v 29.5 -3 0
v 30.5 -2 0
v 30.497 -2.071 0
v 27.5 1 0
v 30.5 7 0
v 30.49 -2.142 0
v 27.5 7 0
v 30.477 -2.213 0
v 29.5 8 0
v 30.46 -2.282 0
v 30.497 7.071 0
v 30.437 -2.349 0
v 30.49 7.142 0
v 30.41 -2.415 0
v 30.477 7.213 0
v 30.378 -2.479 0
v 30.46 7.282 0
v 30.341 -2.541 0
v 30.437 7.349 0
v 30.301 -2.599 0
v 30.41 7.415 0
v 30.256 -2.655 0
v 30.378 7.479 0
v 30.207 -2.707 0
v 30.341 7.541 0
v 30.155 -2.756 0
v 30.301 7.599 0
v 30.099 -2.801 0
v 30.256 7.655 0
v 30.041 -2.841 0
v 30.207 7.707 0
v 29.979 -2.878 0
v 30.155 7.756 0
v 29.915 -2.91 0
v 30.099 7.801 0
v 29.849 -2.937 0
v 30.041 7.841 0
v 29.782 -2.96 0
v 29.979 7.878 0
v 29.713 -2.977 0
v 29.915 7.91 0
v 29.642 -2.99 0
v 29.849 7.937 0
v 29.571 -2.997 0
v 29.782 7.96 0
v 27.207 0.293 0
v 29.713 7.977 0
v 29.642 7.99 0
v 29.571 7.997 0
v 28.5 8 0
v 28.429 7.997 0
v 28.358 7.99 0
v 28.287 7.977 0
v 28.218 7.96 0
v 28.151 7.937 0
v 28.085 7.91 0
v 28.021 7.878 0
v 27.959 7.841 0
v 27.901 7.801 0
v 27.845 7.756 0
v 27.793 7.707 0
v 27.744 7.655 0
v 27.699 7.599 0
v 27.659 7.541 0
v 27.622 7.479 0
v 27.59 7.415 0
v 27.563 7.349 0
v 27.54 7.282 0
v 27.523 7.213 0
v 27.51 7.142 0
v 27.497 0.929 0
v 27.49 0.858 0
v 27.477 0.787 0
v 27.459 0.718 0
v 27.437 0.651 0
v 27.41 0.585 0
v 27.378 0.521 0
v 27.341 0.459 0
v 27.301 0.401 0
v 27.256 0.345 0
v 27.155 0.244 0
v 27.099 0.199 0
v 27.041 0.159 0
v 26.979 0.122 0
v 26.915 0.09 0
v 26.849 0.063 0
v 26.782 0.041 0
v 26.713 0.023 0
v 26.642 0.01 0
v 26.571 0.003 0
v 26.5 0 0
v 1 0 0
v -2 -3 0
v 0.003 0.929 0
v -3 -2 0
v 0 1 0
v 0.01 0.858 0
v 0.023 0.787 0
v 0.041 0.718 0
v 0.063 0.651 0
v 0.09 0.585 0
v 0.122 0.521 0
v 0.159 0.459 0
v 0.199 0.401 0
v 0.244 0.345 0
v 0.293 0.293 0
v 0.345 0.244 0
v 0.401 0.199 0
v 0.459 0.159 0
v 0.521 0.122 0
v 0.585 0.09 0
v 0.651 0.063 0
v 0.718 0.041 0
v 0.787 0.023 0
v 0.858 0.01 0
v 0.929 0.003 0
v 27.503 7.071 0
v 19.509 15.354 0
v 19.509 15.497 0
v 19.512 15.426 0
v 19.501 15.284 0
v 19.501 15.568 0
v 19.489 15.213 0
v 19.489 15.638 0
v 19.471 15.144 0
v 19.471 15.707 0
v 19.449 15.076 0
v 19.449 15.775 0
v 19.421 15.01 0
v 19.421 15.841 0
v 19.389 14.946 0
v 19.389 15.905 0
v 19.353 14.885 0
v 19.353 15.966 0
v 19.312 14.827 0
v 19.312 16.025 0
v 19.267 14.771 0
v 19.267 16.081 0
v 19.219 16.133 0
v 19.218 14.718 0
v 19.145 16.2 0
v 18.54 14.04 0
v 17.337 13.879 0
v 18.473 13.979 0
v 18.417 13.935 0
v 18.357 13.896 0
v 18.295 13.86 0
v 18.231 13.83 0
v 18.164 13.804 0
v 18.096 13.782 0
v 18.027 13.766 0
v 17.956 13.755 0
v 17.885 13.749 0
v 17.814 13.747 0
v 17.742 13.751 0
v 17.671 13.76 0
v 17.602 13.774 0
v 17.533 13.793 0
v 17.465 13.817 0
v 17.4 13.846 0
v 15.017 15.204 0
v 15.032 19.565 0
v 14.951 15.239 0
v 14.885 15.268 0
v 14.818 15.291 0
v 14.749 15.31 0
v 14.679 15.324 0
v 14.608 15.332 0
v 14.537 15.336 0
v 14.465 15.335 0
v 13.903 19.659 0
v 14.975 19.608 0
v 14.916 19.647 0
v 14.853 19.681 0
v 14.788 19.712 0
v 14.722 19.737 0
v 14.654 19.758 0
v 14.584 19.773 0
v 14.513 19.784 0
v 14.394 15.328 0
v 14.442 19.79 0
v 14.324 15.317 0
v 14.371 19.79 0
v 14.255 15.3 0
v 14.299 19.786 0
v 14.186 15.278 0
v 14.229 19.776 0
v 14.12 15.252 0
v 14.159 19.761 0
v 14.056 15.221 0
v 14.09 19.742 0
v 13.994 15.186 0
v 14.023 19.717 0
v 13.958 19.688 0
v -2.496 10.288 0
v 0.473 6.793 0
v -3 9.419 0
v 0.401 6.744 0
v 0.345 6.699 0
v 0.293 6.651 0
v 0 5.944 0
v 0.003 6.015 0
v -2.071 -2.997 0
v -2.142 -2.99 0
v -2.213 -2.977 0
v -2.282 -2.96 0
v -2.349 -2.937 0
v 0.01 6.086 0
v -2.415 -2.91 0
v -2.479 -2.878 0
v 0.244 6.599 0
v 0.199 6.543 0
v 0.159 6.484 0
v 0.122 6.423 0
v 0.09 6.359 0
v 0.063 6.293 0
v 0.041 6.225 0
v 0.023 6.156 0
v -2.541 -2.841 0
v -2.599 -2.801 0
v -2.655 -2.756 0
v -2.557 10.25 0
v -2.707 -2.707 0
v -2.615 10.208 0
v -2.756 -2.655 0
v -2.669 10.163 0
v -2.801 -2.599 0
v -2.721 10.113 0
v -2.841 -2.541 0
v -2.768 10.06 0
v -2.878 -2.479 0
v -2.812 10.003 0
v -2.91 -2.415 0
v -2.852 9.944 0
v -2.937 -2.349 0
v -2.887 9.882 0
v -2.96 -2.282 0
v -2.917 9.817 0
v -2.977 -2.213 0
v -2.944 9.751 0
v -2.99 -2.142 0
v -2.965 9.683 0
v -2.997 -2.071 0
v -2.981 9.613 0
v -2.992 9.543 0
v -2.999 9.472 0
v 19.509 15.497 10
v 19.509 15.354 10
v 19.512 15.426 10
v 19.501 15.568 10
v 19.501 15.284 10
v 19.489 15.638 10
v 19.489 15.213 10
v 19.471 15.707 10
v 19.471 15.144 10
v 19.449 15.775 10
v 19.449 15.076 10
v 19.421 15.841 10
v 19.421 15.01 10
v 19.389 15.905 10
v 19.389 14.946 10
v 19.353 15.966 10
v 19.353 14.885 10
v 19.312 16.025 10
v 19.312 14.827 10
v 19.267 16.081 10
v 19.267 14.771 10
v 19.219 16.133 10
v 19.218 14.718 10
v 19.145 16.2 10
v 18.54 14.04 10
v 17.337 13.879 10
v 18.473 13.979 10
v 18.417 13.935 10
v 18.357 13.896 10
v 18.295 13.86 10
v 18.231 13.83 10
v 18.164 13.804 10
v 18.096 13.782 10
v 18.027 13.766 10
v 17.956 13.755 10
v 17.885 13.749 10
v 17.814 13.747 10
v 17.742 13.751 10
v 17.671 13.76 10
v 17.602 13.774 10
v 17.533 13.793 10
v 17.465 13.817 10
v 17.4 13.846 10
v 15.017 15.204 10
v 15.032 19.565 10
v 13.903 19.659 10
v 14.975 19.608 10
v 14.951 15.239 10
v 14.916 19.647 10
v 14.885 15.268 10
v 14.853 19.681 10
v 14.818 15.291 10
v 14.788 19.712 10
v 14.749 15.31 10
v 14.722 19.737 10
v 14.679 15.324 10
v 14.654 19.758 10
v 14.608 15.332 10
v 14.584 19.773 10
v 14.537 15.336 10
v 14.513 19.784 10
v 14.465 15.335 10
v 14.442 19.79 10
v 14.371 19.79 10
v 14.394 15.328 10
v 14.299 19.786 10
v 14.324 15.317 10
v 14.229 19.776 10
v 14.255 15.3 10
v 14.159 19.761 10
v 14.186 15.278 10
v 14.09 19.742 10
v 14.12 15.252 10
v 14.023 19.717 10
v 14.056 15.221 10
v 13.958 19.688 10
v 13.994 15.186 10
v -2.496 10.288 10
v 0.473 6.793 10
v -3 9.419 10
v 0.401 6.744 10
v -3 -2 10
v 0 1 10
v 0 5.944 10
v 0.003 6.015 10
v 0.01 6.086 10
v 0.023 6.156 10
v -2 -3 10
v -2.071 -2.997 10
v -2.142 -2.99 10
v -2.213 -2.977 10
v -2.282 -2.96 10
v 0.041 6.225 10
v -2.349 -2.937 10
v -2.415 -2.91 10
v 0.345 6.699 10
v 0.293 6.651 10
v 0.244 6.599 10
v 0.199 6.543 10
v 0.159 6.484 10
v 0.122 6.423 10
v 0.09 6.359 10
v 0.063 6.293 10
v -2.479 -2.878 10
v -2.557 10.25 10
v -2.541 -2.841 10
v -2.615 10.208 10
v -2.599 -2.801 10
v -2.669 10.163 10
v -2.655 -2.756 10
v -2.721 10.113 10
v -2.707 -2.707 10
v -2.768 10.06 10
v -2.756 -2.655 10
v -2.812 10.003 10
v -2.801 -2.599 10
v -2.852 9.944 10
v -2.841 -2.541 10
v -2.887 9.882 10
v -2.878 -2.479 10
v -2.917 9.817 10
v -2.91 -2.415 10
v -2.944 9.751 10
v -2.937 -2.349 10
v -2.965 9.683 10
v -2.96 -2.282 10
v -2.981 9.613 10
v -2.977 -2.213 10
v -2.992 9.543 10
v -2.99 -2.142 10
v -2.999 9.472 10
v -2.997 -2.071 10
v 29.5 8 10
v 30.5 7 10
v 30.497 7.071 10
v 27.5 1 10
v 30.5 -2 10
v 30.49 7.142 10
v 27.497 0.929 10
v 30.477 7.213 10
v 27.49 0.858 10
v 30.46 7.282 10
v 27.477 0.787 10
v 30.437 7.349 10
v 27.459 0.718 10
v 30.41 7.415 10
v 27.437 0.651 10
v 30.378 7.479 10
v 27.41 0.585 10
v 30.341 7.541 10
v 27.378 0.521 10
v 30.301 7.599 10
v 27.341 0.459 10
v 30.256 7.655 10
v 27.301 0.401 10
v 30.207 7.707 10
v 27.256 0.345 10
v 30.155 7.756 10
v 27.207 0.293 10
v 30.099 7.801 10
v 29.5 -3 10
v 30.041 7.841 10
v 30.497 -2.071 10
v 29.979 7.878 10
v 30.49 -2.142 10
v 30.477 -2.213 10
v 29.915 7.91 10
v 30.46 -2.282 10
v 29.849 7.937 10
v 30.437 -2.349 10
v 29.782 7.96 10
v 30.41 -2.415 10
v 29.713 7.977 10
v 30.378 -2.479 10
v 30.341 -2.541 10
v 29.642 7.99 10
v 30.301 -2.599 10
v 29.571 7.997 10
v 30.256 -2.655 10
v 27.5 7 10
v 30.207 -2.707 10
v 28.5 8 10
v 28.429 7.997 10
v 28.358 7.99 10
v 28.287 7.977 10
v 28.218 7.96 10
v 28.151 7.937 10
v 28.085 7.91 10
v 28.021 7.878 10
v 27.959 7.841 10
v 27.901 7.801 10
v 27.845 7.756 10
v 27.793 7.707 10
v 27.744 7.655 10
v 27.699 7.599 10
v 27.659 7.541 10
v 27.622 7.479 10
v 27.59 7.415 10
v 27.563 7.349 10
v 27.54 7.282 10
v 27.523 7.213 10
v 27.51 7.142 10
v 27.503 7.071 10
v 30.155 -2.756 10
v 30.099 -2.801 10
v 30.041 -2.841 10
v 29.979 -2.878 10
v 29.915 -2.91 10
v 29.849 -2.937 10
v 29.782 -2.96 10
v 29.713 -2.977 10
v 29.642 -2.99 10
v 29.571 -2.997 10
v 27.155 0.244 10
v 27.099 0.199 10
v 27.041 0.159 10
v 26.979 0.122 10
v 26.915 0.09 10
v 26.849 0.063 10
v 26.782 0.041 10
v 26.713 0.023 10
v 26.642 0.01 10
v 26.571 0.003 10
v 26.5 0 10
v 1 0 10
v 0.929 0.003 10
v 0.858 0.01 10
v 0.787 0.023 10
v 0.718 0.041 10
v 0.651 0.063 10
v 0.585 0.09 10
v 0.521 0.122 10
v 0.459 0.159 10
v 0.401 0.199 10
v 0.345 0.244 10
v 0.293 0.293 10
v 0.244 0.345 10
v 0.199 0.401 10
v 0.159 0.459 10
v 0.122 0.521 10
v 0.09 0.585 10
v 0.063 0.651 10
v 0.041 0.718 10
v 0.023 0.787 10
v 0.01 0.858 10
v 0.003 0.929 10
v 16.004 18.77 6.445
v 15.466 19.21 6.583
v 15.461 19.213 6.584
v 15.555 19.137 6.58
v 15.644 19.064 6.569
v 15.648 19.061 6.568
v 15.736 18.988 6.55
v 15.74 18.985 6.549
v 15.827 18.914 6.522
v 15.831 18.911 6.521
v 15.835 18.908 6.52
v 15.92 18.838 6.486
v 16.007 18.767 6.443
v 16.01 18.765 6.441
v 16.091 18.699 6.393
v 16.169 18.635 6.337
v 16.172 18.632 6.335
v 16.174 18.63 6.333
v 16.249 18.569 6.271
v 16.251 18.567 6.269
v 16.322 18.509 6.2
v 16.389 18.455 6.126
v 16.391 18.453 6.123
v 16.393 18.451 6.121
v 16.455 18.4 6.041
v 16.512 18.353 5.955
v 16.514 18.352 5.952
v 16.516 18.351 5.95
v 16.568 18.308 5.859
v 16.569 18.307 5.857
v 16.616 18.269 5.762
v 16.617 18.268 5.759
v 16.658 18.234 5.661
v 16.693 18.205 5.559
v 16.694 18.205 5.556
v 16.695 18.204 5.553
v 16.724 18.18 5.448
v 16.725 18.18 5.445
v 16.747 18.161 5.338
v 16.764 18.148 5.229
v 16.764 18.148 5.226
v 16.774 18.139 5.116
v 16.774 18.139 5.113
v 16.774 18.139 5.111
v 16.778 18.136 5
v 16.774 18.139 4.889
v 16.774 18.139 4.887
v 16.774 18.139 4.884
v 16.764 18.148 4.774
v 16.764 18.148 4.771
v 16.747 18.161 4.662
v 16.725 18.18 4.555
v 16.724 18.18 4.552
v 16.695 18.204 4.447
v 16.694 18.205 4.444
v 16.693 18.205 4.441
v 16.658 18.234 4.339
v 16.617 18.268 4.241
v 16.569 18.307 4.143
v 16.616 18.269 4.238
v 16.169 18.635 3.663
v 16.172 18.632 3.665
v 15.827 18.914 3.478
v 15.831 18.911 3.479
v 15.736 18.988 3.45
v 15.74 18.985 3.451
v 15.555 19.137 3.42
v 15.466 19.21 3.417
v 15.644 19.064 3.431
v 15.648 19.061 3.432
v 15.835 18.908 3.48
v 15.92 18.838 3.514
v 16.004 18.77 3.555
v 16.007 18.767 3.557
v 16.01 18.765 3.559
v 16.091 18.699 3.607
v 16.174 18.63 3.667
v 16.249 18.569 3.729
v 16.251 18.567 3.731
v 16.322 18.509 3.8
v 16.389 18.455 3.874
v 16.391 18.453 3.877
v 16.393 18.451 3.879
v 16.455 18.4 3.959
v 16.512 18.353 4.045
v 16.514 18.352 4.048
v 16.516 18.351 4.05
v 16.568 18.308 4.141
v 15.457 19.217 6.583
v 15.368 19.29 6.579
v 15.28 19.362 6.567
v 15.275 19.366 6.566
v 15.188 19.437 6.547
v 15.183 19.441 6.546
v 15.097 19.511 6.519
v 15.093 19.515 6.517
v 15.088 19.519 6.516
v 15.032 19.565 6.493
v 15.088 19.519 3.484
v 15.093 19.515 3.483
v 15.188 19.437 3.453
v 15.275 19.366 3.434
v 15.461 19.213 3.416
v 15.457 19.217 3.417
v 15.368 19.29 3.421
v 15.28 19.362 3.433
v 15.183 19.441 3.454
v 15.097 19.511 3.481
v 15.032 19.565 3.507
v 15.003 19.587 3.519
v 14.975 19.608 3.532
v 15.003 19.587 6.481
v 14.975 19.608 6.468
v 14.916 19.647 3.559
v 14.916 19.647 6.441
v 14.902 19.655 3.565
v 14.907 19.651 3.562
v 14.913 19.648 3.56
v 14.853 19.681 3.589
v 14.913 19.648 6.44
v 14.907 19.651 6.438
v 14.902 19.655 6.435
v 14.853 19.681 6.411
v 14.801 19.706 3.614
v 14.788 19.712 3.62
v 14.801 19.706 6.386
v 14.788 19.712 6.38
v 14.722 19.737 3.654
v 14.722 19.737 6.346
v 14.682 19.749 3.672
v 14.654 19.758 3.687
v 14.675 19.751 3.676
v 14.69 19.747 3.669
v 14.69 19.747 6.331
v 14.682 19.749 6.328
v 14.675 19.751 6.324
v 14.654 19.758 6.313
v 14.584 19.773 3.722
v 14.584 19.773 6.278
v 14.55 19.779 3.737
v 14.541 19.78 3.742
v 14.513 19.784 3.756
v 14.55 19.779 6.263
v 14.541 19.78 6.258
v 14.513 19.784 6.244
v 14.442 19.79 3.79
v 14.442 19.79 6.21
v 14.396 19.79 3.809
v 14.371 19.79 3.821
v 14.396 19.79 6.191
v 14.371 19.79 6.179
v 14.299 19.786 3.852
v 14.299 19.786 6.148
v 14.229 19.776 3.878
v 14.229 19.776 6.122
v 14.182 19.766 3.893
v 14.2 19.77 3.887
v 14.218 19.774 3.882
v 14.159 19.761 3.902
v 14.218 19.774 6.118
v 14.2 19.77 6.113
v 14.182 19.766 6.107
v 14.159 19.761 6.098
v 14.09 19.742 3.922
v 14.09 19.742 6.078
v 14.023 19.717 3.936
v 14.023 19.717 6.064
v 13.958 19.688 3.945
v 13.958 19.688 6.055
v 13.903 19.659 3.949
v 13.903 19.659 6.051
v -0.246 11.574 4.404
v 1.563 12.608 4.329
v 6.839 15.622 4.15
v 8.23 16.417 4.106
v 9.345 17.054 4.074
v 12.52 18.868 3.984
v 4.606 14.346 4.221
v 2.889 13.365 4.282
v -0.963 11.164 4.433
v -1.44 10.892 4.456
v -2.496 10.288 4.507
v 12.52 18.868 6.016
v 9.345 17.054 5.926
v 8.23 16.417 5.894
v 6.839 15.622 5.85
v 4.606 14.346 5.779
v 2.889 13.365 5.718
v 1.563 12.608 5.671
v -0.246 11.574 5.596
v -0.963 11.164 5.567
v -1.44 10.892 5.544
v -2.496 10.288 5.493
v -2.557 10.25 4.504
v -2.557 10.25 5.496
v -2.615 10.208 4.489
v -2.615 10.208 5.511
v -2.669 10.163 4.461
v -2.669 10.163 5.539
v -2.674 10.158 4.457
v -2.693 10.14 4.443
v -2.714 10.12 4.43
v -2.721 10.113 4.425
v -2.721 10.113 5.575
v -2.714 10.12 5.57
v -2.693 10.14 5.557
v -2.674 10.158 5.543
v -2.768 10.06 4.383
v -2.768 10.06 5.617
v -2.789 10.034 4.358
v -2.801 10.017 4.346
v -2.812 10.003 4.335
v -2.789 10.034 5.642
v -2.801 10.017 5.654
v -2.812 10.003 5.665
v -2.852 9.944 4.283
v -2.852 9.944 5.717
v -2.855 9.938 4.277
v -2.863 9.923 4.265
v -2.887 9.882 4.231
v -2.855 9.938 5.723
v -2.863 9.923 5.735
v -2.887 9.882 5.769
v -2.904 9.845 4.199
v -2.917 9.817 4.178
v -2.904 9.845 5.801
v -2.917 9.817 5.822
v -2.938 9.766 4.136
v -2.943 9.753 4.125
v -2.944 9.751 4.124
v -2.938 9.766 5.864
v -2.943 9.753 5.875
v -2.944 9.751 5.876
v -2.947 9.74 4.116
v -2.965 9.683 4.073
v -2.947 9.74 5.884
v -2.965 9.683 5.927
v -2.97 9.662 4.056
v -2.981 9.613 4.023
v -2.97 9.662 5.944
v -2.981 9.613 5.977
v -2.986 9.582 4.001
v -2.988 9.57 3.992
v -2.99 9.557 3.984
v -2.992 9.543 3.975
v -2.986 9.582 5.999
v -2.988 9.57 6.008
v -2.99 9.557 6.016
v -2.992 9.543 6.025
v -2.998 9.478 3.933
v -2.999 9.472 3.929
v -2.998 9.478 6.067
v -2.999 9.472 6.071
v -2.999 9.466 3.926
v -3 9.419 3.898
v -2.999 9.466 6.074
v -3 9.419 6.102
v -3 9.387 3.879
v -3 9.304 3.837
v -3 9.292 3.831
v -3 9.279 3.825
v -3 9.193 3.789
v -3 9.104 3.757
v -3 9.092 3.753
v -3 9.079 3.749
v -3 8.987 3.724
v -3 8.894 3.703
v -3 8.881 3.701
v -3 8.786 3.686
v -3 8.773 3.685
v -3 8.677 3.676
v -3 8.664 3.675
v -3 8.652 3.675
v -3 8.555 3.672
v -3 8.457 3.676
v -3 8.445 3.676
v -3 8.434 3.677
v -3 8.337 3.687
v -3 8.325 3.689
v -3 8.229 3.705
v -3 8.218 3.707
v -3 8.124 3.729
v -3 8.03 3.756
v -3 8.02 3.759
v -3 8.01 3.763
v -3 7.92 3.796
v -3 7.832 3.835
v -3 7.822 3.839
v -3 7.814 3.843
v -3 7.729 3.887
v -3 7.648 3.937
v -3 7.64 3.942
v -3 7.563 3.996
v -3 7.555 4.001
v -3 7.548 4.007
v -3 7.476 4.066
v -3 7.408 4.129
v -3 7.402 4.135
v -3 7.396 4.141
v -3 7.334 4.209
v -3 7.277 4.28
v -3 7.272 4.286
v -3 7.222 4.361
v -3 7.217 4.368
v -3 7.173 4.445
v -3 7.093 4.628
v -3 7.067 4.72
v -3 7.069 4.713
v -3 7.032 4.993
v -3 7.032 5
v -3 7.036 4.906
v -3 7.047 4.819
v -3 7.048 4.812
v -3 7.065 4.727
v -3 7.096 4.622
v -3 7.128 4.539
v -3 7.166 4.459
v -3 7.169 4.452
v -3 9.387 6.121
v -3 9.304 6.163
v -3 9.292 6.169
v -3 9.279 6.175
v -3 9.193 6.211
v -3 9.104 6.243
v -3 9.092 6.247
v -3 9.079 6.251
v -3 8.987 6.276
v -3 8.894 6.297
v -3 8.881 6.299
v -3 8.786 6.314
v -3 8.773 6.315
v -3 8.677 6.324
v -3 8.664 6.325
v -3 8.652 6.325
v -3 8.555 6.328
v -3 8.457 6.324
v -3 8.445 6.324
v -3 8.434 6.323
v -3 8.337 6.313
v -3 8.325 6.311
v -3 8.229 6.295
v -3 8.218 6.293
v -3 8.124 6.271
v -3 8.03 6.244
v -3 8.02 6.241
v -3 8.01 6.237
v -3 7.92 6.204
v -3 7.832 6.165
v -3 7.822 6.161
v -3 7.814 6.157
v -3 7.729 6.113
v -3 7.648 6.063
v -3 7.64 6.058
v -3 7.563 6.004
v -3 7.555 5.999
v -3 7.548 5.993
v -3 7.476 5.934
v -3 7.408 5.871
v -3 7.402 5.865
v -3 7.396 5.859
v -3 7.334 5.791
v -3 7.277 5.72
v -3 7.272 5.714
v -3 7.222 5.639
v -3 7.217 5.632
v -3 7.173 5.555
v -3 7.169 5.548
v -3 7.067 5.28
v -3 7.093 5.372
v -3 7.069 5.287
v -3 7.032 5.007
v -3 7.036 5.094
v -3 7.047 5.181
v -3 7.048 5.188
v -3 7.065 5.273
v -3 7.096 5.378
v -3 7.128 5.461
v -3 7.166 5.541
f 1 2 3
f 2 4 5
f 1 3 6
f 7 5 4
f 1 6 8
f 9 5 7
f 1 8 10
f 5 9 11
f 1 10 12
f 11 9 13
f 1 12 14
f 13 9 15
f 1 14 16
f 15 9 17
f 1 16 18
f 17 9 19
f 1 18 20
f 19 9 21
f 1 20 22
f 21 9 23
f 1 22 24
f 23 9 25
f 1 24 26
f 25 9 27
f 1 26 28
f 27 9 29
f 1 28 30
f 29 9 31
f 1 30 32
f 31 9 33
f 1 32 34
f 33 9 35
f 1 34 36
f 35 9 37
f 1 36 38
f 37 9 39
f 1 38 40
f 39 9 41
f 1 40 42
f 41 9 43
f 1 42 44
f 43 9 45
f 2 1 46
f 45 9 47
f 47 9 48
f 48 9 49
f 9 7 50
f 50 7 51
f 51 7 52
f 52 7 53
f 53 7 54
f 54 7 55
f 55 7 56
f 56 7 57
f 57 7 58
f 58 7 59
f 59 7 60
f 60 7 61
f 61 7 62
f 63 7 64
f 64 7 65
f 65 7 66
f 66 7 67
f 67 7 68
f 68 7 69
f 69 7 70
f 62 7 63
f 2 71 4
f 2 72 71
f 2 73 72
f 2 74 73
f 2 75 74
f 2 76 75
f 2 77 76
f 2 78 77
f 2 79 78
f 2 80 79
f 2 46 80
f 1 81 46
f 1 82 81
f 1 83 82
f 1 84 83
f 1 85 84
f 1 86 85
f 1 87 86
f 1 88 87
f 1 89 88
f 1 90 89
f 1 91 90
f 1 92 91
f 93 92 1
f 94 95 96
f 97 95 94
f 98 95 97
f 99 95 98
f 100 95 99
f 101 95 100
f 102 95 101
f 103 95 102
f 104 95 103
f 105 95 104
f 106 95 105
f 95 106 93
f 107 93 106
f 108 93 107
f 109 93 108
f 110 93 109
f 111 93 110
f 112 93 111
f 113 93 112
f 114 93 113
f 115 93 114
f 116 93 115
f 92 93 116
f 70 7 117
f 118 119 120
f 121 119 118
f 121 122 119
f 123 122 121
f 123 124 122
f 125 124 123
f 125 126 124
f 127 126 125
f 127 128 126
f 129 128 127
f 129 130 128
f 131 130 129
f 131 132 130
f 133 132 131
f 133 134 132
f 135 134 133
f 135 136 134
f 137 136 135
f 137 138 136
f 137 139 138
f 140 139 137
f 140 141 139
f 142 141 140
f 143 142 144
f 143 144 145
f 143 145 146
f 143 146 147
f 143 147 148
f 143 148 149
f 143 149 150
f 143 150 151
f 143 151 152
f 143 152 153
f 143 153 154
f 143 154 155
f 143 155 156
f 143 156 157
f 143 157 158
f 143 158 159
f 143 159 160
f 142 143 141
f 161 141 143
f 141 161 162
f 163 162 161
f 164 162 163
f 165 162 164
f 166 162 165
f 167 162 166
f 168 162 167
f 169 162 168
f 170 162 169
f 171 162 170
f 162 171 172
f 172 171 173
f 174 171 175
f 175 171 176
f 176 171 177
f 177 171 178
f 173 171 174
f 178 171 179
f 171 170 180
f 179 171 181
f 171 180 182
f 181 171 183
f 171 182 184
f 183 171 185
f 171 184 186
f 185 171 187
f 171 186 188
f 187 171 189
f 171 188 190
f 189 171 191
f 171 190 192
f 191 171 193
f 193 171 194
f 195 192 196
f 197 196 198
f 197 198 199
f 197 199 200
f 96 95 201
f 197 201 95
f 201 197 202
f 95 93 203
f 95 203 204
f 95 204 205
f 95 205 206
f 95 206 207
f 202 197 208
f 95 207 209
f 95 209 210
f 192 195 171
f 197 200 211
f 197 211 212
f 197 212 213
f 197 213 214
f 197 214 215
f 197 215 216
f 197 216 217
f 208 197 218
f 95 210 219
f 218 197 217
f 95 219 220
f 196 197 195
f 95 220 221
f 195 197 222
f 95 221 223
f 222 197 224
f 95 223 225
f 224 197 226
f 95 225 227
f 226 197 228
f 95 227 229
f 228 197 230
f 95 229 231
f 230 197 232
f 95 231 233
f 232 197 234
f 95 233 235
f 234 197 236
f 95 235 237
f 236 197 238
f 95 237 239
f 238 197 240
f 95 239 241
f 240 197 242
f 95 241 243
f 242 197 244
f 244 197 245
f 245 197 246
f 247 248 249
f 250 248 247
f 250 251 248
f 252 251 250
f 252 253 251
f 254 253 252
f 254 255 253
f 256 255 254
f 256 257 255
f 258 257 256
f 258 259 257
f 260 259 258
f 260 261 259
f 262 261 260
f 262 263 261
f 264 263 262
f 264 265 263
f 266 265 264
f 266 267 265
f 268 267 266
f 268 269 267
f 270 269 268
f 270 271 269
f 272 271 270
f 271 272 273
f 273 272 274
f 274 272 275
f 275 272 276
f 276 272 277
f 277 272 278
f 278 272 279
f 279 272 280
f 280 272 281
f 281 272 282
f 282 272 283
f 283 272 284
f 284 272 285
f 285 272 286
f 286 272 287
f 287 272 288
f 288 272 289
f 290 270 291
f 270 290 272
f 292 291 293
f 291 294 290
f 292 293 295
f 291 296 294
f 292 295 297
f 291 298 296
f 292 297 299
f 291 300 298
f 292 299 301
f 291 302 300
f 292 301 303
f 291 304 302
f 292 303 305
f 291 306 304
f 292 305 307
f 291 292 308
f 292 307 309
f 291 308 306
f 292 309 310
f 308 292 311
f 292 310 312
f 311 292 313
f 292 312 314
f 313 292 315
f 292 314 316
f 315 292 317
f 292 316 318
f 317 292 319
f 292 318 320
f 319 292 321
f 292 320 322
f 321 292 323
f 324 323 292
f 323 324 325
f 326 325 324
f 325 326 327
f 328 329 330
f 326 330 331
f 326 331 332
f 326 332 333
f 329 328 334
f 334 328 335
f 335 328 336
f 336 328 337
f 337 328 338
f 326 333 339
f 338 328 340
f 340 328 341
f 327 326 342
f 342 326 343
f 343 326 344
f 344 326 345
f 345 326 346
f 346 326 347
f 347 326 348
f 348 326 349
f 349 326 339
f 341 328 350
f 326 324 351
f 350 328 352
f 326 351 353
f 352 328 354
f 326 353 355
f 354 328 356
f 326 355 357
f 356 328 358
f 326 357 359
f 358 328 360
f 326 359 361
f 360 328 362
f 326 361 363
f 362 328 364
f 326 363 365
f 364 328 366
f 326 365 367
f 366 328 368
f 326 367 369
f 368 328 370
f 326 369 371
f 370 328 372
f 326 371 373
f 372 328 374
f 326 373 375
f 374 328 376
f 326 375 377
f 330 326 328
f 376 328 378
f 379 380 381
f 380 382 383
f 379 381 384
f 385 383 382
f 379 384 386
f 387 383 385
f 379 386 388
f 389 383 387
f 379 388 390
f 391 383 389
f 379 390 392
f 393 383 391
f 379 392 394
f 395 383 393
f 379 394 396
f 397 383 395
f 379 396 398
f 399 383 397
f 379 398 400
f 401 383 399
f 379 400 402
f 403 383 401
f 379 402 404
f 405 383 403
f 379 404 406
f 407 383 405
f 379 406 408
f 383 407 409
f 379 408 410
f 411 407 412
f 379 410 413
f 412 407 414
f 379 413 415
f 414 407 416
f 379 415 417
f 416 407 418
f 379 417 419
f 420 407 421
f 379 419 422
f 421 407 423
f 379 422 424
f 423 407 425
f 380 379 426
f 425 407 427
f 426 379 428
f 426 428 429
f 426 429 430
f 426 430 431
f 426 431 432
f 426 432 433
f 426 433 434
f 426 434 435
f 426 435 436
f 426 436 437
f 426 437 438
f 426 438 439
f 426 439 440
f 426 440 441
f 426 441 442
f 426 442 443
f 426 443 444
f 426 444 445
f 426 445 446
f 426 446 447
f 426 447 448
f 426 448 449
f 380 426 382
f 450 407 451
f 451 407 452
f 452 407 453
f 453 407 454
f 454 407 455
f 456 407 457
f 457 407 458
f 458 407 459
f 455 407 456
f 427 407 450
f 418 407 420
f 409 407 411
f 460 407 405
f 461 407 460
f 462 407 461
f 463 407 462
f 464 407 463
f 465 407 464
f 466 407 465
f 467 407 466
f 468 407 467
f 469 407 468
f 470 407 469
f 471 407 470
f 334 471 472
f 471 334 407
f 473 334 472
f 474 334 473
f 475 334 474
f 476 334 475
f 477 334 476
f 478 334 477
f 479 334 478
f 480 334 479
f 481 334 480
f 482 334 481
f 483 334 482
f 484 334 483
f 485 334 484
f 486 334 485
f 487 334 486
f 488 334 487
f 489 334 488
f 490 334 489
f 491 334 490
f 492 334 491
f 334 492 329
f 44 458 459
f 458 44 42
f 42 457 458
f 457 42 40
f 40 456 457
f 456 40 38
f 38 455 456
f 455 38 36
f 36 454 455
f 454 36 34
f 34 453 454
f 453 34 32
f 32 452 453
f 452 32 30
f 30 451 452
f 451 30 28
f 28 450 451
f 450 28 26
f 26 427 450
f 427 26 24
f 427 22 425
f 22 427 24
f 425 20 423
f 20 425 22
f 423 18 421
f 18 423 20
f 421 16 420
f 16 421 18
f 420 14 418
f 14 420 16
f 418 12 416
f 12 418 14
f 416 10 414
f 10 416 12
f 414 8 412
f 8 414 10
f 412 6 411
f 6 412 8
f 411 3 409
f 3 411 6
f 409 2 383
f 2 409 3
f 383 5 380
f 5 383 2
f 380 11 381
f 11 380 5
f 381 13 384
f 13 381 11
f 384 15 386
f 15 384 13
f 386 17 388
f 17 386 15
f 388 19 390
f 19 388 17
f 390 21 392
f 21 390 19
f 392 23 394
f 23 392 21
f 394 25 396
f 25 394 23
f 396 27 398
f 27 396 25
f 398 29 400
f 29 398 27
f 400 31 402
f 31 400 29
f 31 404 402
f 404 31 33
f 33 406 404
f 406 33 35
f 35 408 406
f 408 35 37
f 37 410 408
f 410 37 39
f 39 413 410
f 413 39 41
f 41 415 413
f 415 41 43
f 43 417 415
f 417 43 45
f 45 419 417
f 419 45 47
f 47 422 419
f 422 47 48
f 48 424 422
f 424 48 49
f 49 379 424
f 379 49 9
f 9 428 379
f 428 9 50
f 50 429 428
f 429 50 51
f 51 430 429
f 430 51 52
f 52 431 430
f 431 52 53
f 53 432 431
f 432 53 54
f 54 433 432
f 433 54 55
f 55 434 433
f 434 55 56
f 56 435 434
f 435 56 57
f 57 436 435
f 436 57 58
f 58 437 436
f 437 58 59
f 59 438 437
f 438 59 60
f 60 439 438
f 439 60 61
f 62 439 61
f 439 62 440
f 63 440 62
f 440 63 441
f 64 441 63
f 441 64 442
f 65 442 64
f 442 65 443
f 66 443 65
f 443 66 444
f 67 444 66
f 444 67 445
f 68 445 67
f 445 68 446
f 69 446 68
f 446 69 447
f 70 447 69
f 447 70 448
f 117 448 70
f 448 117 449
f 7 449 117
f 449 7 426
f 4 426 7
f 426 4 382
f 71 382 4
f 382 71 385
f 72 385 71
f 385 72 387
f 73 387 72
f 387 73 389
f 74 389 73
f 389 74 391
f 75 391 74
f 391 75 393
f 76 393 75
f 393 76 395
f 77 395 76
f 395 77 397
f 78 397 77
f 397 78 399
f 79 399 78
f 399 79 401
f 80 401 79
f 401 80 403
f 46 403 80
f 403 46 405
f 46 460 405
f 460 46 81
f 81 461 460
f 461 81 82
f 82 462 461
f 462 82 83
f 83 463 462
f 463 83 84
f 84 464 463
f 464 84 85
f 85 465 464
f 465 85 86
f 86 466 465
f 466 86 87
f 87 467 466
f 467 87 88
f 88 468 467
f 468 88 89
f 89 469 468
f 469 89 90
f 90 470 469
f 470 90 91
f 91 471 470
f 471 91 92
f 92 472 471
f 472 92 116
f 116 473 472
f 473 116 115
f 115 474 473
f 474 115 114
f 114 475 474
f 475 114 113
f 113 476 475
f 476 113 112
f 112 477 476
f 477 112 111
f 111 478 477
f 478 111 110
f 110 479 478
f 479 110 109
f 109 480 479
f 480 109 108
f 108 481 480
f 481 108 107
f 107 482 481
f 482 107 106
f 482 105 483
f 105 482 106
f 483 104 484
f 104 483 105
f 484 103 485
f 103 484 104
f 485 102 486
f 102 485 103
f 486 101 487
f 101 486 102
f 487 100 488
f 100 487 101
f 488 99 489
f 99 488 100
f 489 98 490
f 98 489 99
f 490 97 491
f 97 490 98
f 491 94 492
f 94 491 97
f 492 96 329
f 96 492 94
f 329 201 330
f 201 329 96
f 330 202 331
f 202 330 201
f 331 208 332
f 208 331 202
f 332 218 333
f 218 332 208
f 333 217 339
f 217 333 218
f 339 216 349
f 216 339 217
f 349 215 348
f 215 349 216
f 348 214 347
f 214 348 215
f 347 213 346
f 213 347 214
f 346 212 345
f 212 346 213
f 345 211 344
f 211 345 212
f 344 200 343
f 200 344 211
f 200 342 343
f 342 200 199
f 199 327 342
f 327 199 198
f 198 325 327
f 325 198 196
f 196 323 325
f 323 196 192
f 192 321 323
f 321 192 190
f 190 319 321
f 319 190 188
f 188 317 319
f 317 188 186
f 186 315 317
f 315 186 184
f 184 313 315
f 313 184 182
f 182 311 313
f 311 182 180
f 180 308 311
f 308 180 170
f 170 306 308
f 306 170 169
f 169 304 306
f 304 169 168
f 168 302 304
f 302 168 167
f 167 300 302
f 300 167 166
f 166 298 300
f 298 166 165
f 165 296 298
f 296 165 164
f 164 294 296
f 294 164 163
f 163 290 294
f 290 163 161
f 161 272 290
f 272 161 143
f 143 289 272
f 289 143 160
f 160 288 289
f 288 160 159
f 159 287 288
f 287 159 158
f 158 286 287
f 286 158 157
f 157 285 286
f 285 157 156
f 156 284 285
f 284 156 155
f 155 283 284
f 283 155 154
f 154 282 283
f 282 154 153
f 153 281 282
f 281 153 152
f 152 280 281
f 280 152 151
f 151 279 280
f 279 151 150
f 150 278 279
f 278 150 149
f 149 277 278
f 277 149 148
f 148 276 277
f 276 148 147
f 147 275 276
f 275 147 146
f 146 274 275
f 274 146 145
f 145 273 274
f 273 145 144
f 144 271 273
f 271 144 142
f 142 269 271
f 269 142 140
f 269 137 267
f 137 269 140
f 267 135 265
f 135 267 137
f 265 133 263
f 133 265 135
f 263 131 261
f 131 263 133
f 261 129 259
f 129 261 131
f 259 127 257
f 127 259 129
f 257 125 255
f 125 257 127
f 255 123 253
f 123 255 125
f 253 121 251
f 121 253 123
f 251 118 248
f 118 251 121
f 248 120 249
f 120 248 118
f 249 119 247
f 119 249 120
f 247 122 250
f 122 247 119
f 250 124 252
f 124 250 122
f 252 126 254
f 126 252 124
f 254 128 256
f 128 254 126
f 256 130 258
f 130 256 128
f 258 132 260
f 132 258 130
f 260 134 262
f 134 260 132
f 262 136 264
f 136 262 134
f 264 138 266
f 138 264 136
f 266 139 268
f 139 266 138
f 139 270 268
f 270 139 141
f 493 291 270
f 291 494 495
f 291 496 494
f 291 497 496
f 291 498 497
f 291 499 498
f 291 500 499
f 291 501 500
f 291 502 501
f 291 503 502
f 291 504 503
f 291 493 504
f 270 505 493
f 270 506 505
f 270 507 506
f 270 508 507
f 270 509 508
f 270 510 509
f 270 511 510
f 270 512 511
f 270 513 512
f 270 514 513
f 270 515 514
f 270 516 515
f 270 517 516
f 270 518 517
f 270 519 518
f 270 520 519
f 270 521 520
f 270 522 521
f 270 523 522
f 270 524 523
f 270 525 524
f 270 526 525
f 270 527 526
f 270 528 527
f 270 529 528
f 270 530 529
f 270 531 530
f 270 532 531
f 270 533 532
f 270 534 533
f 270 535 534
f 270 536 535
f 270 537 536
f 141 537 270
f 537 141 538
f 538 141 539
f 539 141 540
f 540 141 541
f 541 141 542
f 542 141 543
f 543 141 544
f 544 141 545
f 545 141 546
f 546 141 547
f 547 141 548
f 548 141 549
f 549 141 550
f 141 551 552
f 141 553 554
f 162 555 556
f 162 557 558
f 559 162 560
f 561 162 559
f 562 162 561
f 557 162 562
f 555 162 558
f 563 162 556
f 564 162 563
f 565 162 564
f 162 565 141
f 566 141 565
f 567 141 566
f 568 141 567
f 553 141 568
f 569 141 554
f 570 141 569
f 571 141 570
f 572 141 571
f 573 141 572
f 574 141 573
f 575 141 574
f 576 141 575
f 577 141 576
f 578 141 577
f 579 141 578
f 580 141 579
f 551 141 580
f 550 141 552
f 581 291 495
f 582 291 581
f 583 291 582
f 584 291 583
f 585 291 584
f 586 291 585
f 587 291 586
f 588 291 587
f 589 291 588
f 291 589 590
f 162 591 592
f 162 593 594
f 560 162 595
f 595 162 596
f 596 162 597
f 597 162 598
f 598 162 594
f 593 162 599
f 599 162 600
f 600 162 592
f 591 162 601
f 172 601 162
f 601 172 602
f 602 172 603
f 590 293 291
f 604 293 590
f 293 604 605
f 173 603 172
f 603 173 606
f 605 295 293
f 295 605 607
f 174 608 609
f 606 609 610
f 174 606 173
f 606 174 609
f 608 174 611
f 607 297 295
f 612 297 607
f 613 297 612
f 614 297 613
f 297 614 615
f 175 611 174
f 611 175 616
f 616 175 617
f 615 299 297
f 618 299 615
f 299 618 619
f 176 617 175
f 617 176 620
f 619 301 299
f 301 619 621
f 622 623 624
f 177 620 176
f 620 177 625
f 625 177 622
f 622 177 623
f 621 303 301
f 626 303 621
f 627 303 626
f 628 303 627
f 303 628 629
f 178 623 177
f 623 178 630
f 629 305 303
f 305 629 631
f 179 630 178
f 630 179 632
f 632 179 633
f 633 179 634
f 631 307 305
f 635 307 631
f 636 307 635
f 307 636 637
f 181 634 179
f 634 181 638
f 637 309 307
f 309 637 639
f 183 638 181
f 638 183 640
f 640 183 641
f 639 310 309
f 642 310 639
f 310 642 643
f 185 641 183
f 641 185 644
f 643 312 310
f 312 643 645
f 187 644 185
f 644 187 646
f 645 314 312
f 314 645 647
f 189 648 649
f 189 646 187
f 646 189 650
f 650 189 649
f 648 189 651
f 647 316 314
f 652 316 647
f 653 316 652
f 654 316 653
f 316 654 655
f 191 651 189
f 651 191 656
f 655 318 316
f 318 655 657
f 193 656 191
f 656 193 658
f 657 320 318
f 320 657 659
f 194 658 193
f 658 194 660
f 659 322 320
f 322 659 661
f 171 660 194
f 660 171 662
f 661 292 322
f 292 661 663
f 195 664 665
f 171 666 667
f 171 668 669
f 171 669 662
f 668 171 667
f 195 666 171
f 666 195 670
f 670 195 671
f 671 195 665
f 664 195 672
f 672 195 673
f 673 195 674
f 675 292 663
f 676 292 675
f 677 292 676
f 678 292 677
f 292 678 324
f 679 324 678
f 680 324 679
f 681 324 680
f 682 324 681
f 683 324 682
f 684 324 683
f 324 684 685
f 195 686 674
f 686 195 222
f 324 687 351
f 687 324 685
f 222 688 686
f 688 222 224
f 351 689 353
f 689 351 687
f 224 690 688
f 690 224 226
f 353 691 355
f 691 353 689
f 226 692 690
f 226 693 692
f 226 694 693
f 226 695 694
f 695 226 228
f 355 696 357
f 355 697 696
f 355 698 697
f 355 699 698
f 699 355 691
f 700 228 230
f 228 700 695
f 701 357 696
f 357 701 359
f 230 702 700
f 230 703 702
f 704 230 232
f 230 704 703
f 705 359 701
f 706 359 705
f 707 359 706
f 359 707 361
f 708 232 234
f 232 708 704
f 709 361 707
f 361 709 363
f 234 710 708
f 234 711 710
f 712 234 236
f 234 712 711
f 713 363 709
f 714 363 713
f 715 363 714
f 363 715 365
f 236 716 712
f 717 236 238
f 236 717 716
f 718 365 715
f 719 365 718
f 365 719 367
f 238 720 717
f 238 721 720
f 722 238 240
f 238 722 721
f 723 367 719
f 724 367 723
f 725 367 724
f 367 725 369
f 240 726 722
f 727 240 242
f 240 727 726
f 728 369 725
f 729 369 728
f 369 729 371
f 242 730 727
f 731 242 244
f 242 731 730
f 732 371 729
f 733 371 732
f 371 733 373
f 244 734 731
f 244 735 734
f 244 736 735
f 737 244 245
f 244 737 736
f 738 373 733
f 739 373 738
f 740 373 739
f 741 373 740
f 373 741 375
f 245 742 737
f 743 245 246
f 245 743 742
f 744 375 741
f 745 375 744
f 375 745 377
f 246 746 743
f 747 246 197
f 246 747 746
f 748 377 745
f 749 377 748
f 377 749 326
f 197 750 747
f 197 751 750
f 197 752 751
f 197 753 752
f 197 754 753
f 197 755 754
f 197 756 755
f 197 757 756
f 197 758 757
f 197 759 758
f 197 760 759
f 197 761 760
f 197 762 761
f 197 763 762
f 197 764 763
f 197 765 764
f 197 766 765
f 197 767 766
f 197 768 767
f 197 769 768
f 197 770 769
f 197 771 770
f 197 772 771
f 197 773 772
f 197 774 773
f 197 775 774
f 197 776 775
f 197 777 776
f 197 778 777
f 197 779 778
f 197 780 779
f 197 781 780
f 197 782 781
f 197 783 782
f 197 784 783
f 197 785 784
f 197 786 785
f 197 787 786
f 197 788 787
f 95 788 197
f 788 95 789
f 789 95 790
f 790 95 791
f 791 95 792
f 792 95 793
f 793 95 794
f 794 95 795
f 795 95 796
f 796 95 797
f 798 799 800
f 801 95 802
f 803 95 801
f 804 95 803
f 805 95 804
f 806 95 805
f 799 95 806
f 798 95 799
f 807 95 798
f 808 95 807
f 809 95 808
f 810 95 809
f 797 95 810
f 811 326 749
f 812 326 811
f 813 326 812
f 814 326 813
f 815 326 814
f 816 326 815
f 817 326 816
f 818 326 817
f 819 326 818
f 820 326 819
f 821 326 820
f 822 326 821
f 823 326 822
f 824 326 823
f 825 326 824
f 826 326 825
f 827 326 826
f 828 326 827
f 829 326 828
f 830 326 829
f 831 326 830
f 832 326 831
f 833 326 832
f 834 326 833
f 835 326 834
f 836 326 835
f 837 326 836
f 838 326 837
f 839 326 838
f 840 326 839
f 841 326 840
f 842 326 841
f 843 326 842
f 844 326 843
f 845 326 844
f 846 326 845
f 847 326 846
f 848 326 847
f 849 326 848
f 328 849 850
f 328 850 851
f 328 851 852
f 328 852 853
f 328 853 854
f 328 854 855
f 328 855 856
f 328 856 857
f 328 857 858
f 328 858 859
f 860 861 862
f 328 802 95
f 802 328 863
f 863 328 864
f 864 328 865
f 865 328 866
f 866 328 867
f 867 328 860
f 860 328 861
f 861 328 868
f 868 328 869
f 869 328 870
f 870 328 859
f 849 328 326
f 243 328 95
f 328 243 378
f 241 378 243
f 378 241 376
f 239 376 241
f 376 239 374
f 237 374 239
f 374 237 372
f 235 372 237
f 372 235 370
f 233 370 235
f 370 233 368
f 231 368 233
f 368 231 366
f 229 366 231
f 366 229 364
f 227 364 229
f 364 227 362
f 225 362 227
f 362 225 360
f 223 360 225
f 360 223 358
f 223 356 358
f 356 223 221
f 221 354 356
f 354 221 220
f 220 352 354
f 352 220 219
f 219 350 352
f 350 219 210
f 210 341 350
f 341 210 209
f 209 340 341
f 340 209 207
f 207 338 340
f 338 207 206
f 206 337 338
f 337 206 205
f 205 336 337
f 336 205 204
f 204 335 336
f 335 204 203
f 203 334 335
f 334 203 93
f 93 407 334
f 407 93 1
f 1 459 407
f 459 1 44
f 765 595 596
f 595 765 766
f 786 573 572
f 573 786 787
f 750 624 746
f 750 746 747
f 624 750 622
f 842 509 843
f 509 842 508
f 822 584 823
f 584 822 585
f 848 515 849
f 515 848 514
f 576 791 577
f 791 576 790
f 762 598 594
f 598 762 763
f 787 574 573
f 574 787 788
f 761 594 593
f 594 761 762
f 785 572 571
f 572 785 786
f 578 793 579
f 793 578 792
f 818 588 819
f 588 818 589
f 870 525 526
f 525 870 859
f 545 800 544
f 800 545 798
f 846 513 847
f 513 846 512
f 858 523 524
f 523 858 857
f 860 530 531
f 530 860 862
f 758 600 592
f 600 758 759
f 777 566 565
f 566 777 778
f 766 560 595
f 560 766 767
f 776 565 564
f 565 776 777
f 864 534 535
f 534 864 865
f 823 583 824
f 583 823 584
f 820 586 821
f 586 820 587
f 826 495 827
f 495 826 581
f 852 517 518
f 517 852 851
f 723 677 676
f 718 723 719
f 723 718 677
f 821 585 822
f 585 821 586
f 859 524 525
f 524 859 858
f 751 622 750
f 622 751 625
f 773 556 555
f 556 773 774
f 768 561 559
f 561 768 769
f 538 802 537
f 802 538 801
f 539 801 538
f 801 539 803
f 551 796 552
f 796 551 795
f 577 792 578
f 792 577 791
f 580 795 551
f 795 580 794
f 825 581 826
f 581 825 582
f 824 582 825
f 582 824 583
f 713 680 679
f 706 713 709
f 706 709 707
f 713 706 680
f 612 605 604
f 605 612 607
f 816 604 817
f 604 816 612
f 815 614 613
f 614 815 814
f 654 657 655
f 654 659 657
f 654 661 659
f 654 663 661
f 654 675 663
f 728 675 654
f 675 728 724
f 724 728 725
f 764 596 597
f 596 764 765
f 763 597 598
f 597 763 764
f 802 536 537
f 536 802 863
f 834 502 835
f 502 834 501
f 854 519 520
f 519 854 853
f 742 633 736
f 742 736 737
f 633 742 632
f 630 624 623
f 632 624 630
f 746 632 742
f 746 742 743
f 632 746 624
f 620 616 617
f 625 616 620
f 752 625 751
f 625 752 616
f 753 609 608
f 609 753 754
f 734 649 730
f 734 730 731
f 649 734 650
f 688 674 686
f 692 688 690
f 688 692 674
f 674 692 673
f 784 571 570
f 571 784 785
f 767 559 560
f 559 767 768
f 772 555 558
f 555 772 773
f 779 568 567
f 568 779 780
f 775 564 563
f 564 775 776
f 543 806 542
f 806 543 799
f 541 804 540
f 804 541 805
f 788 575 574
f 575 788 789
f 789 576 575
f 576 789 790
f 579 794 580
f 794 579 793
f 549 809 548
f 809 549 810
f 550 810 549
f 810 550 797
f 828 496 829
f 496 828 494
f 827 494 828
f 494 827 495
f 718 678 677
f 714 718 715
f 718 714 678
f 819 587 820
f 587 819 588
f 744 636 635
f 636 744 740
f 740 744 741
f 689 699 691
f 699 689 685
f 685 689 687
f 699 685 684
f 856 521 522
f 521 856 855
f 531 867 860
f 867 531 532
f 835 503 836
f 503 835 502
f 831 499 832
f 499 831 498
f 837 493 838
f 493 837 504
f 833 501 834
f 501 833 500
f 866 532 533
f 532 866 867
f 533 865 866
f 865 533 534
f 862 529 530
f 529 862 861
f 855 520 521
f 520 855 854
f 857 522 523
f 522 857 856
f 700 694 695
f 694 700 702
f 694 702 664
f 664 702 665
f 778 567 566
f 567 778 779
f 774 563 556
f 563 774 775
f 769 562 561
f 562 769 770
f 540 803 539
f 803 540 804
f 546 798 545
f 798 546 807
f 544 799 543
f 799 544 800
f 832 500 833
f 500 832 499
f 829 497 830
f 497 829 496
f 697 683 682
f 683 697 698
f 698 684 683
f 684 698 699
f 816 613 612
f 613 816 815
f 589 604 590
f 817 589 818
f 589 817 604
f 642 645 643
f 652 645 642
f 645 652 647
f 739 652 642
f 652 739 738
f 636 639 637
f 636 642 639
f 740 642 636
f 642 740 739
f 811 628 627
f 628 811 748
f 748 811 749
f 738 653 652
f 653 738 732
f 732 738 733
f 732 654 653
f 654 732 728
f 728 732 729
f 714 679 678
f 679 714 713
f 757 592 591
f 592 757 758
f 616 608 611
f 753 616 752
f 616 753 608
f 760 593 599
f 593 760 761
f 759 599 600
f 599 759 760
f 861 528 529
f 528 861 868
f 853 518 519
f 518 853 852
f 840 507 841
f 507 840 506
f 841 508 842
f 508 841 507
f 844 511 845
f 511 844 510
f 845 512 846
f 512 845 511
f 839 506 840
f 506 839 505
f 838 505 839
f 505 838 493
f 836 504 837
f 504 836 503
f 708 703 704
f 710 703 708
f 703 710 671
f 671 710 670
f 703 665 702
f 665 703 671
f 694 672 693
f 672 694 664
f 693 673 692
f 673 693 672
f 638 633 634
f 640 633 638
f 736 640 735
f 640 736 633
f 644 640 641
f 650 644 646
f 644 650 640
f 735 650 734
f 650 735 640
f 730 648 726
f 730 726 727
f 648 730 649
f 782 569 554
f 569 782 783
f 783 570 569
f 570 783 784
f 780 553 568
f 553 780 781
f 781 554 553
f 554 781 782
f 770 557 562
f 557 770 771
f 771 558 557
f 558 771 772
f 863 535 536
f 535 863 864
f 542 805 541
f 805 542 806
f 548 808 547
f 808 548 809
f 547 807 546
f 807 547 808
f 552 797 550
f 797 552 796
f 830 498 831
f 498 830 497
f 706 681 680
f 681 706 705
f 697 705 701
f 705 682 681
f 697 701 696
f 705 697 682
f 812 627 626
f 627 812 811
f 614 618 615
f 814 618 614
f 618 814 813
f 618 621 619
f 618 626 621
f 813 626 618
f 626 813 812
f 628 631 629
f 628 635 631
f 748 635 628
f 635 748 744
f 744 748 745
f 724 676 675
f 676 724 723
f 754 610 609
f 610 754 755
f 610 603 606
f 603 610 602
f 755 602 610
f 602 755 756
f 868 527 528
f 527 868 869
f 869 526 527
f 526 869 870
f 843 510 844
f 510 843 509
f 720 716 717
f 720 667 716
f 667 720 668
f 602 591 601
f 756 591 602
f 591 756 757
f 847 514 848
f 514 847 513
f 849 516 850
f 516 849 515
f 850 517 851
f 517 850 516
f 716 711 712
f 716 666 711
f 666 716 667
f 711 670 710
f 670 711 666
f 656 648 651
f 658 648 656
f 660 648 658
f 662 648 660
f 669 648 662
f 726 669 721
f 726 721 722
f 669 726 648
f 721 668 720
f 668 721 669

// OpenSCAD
// basketclip.scad
// Bike basket has this clip on the handle to attach a 3mm sideglow and
// direct the tip towards the whirlygig on the back.

//----------------------------------------------------
module basketclip(){

x1=27.5;
th=3;

pts=[ [0,0], [x1,0], [x1,8], [x1+th,8], [x1+th,-th], [-th,-th],
      [-th,10], [14.5,20], [20,15.5], [18,13.5], [14.5,15.5], [0,6.5] ];

difference(convexity=10){      
  //minkowski(){
    linear_extrude(height=10,convexity=10)
    //fillet inner corners
    offset(r=-1,$fn=88)
    offset(delta=1,$fn=88)
    // round outer corners
    offset(r=1,$fn=88)
    offset(r=-1,$fn=88)
    polygon(pts);      
    
    //cylinder(r=1,$fn=80);
  //}

  color("red")
  translate([-5,7.4,5])
  rotate([0,0,30])
  rotate([0,90,0])
  cylinder(r1=1.3,r2=1.6,h=25,$fn=88);
}

}

//==============================================================

basketclip();

//==============================================================
